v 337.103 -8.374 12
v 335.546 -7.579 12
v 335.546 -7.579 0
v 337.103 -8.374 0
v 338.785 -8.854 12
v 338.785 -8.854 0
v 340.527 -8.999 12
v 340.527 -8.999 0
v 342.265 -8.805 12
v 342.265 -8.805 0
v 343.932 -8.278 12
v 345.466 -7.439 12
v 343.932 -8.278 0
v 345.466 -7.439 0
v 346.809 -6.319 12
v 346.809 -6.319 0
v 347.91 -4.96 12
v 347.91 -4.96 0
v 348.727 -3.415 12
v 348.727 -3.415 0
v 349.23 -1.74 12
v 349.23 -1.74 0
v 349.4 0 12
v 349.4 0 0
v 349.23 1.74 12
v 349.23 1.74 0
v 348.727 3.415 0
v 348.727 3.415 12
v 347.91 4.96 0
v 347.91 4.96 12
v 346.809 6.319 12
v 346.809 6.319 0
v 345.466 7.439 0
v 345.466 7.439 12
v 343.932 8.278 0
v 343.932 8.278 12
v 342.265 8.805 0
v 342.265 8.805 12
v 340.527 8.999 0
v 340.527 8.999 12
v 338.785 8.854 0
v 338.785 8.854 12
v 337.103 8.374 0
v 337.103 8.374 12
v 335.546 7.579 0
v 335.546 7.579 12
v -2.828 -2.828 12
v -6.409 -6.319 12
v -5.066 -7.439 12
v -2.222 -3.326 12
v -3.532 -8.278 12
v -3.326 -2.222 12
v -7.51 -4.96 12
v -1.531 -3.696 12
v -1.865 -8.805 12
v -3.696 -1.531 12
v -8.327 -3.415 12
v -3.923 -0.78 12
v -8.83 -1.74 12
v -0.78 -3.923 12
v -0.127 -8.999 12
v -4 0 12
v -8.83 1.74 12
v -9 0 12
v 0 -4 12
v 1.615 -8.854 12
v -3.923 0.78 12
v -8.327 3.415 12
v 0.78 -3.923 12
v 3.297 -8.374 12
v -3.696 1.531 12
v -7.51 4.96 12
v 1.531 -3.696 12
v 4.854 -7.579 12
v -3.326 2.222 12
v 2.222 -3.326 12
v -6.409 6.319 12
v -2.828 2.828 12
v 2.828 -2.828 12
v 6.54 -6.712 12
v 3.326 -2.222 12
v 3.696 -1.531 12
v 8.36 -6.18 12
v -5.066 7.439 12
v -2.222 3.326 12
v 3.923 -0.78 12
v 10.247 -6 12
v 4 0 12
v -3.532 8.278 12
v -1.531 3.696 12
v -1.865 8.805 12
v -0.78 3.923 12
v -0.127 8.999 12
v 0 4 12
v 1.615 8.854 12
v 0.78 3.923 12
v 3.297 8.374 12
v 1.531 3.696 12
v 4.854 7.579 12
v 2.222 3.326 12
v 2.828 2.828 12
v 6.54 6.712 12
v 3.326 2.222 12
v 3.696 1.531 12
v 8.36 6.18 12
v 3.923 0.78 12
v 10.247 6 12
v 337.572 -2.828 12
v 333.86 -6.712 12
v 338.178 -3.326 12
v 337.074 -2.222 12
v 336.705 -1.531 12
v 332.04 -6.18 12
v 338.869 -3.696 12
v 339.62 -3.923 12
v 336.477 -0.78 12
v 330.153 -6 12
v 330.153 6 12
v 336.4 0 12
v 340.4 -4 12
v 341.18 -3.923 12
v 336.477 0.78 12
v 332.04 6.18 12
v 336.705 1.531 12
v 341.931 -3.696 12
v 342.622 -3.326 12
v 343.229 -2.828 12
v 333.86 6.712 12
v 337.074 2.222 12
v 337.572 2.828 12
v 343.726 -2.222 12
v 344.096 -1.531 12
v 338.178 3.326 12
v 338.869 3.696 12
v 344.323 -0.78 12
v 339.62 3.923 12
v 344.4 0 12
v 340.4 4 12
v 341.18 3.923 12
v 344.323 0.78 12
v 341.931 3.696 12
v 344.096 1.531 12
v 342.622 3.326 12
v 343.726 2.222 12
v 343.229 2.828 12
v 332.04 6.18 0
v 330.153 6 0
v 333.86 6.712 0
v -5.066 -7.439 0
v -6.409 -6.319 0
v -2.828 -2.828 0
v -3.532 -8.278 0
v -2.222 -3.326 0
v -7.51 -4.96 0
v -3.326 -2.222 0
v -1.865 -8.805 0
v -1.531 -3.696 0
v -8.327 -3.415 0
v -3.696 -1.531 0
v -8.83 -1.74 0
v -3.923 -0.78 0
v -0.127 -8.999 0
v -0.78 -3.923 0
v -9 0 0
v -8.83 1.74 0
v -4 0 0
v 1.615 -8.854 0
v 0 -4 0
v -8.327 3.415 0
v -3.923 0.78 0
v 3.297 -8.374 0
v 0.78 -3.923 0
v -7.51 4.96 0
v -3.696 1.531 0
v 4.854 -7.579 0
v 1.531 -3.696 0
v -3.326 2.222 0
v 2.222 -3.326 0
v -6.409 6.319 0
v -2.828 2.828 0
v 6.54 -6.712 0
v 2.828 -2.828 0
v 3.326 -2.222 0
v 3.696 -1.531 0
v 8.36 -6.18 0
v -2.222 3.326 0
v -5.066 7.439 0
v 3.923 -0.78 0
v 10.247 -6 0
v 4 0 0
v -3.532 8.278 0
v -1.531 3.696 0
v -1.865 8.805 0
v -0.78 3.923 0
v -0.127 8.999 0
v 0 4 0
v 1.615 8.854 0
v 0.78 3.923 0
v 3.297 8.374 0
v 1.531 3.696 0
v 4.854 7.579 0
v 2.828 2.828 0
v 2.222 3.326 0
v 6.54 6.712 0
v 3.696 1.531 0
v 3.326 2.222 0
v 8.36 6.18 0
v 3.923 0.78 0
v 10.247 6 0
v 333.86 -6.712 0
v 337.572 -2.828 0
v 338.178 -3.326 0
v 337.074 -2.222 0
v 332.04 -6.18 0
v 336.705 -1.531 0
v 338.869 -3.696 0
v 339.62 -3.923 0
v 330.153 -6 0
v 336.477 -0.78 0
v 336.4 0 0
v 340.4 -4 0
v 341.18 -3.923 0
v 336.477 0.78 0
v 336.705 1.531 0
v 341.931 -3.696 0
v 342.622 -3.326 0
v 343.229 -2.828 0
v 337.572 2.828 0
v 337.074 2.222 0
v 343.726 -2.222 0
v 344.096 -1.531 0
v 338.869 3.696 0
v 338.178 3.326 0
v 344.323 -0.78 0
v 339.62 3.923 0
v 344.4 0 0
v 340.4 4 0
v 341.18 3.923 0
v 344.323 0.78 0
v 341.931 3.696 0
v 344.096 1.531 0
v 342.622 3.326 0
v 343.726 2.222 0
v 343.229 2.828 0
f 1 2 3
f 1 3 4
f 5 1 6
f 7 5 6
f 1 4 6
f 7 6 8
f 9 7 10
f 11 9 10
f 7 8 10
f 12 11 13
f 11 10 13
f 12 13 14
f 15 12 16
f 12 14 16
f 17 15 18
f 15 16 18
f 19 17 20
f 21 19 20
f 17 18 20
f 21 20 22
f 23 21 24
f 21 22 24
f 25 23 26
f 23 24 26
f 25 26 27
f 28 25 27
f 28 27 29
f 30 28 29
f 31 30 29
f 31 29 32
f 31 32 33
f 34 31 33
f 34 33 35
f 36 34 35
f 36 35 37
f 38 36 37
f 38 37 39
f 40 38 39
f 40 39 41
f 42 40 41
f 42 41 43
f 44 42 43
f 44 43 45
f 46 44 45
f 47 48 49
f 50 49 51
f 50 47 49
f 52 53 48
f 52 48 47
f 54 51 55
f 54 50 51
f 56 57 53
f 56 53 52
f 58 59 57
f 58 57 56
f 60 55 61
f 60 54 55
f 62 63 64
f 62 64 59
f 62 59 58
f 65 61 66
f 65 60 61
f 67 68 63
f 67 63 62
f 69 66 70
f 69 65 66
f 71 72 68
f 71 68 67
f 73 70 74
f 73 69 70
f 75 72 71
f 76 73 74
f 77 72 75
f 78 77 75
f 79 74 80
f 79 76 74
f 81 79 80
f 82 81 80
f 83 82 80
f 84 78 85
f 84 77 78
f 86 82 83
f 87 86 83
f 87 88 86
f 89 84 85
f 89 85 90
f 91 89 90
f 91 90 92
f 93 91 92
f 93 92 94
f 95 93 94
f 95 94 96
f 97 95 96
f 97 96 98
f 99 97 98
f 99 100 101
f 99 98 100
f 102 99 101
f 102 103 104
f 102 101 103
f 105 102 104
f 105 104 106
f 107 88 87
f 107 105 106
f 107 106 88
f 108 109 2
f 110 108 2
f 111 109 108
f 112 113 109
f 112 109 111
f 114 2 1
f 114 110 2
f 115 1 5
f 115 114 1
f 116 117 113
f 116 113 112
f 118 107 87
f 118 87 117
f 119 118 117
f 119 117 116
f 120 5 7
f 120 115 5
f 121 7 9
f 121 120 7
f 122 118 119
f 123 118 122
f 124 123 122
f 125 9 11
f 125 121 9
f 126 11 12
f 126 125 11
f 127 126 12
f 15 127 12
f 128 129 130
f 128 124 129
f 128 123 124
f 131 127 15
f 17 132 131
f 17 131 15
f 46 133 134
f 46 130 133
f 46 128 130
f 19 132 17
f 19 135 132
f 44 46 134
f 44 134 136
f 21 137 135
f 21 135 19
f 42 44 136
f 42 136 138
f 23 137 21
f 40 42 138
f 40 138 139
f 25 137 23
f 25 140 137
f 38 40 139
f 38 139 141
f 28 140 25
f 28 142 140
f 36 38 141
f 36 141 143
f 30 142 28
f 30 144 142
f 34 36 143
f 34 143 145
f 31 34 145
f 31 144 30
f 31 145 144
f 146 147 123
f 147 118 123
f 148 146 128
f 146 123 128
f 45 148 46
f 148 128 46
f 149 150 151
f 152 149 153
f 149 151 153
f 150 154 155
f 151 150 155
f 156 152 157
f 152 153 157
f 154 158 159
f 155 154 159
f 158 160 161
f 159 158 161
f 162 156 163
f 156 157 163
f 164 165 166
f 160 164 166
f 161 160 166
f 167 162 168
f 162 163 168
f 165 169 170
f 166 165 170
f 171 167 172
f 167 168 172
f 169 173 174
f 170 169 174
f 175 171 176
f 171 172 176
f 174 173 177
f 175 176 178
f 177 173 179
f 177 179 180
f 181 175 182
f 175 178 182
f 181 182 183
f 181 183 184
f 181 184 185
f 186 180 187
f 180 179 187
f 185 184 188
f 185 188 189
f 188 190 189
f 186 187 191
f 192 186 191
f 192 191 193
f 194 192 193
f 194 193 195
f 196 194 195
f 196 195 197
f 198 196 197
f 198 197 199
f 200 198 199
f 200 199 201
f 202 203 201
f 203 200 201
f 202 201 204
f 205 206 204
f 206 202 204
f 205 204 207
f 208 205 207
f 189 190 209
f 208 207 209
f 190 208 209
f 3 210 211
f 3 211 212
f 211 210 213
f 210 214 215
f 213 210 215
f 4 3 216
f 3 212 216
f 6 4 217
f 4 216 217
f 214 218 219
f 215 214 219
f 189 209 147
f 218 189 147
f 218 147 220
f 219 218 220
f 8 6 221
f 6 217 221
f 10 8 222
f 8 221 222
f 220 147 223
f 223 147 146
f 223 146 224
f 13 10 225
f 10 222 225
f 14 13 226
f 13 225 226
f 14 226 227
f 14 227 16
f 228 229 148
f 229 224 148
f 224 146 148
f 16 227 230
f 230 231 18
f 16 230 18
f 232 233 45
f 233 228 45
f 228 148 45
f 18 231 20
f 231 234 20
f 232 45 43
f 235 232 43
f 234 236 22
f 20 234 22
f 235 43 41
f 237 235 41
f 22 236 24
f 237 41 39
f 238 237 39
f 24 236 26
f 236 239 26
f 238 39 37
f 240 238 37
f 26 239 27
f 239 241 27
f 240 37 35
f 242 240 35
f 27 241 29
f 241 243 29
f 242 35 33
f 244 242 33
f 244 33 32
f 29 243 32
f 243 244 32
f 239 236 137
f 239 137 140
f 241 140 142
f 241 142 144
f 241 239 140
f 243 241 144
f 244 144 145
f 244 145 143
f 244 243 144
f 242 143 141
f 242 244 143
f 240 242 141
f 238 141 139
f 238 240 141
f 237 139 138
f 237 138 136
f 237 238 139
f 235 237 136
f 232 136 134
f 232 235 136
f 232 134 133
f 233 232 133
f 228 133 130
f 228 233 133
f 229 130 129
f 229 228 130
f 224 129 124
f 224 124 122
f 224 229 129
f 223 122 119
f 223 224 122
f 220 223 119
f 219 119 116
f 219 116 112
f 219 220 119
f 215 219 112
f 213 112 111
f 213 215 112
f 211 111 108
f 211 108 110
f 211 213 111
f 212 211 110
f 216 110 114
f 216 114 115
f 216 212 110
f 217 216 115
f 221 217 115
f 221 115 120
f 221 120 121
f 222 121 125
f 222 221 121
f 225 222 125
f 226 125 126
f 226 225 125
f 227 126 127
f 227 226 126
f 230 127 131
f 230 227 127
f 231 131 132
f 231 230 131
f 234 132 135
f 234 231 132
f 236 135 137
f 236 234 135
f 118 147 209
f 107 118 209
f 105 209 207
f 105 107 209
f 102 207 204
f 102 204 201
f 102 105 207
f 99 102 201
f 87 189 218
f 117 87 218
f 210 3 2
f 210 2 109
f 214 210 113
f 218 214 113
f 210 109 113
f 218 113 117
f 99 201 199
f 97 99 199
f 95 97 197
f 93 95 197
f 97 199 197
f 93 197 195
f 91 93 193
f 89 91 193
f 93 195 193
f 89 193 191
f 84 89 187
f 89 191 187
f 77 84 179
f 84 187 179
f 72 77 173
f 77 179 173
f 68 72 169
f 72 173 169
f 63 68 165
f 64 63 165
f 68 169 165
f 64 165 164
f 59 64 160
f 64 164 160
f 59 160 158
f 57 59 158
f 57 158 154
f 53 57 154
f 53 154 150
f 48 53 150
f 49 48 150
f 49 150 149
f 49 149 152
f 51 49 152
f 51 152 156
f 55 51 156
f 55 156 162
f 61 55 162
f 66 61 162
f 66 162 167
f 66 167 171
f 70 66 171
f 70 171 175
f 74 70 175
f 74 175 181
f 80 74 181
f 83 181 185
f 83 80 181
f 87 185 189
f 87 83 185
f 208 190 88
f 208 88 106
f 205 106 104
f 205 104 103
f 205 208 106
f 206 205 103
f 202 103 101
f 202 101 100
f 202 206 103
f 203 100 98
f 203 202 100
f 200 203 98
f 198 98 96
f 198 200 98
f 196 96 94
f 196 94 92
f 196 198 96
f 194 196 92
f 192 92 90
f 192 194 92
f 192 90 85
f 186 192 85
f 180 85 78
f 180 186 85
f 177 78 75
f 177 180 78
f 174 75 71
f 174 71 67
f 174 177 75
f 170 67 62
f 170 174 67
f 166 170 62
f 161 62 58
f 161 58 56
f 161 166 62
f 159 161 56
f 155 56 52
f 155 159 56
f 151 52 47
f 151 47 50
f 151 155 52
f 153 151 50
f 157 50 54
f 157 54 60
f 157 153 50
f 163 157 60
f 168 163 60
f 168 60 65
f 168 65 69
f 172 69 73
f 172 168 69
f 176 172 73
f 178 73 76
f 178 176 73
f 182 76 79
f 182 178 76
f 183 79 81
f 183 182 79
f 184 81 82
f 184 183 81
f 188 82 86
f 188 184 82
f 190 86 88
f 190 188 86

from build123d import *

# Parameters (mm, degrees)
SKETCH1_R           = 4
BOSS_EXTRUDE1_DEPTH = 12
FILLET1_R           = 10


with BuildPart() as part:
    # Sketch1 → Boss-Extrude1 (new body)
    with BuildSketch(Plane.XY):
        with BuildLine():
            Line((333.691896068, 6), (6.708203932, 6))
            ThreePointArc((6.708203932, 6), (-9, 0), (6.708203932, -6))
            Line((6.708203932, -6), (333.691896068, -6))
            ThreePointArc((333.691896068, -6), (349.4001, 0), (333.691896068, 6))
        make_face()
        Circle(SKETCH1_R, mode=Mode.SUBTRACT)
        with Locations((340.4001, 0)):
            Circle(SKETCH1_R, mode=Mode.SUBTRACT)
    extrude(amount=BOSS_EXTRUDE1_DEPTH)

    # Fillet1
    fillet1_edges = [part.edges().sort_by_distance(p)[0] for p in [
        (6.708203932, 6, 6),
        (333.691896068, 6, 6),
        (333.691896068, -6, 6),
        (6.708203932, -6, 6),
    ]]
    fillet(fillet1_edges, radius=FILLET1_R)


solid = part.part
